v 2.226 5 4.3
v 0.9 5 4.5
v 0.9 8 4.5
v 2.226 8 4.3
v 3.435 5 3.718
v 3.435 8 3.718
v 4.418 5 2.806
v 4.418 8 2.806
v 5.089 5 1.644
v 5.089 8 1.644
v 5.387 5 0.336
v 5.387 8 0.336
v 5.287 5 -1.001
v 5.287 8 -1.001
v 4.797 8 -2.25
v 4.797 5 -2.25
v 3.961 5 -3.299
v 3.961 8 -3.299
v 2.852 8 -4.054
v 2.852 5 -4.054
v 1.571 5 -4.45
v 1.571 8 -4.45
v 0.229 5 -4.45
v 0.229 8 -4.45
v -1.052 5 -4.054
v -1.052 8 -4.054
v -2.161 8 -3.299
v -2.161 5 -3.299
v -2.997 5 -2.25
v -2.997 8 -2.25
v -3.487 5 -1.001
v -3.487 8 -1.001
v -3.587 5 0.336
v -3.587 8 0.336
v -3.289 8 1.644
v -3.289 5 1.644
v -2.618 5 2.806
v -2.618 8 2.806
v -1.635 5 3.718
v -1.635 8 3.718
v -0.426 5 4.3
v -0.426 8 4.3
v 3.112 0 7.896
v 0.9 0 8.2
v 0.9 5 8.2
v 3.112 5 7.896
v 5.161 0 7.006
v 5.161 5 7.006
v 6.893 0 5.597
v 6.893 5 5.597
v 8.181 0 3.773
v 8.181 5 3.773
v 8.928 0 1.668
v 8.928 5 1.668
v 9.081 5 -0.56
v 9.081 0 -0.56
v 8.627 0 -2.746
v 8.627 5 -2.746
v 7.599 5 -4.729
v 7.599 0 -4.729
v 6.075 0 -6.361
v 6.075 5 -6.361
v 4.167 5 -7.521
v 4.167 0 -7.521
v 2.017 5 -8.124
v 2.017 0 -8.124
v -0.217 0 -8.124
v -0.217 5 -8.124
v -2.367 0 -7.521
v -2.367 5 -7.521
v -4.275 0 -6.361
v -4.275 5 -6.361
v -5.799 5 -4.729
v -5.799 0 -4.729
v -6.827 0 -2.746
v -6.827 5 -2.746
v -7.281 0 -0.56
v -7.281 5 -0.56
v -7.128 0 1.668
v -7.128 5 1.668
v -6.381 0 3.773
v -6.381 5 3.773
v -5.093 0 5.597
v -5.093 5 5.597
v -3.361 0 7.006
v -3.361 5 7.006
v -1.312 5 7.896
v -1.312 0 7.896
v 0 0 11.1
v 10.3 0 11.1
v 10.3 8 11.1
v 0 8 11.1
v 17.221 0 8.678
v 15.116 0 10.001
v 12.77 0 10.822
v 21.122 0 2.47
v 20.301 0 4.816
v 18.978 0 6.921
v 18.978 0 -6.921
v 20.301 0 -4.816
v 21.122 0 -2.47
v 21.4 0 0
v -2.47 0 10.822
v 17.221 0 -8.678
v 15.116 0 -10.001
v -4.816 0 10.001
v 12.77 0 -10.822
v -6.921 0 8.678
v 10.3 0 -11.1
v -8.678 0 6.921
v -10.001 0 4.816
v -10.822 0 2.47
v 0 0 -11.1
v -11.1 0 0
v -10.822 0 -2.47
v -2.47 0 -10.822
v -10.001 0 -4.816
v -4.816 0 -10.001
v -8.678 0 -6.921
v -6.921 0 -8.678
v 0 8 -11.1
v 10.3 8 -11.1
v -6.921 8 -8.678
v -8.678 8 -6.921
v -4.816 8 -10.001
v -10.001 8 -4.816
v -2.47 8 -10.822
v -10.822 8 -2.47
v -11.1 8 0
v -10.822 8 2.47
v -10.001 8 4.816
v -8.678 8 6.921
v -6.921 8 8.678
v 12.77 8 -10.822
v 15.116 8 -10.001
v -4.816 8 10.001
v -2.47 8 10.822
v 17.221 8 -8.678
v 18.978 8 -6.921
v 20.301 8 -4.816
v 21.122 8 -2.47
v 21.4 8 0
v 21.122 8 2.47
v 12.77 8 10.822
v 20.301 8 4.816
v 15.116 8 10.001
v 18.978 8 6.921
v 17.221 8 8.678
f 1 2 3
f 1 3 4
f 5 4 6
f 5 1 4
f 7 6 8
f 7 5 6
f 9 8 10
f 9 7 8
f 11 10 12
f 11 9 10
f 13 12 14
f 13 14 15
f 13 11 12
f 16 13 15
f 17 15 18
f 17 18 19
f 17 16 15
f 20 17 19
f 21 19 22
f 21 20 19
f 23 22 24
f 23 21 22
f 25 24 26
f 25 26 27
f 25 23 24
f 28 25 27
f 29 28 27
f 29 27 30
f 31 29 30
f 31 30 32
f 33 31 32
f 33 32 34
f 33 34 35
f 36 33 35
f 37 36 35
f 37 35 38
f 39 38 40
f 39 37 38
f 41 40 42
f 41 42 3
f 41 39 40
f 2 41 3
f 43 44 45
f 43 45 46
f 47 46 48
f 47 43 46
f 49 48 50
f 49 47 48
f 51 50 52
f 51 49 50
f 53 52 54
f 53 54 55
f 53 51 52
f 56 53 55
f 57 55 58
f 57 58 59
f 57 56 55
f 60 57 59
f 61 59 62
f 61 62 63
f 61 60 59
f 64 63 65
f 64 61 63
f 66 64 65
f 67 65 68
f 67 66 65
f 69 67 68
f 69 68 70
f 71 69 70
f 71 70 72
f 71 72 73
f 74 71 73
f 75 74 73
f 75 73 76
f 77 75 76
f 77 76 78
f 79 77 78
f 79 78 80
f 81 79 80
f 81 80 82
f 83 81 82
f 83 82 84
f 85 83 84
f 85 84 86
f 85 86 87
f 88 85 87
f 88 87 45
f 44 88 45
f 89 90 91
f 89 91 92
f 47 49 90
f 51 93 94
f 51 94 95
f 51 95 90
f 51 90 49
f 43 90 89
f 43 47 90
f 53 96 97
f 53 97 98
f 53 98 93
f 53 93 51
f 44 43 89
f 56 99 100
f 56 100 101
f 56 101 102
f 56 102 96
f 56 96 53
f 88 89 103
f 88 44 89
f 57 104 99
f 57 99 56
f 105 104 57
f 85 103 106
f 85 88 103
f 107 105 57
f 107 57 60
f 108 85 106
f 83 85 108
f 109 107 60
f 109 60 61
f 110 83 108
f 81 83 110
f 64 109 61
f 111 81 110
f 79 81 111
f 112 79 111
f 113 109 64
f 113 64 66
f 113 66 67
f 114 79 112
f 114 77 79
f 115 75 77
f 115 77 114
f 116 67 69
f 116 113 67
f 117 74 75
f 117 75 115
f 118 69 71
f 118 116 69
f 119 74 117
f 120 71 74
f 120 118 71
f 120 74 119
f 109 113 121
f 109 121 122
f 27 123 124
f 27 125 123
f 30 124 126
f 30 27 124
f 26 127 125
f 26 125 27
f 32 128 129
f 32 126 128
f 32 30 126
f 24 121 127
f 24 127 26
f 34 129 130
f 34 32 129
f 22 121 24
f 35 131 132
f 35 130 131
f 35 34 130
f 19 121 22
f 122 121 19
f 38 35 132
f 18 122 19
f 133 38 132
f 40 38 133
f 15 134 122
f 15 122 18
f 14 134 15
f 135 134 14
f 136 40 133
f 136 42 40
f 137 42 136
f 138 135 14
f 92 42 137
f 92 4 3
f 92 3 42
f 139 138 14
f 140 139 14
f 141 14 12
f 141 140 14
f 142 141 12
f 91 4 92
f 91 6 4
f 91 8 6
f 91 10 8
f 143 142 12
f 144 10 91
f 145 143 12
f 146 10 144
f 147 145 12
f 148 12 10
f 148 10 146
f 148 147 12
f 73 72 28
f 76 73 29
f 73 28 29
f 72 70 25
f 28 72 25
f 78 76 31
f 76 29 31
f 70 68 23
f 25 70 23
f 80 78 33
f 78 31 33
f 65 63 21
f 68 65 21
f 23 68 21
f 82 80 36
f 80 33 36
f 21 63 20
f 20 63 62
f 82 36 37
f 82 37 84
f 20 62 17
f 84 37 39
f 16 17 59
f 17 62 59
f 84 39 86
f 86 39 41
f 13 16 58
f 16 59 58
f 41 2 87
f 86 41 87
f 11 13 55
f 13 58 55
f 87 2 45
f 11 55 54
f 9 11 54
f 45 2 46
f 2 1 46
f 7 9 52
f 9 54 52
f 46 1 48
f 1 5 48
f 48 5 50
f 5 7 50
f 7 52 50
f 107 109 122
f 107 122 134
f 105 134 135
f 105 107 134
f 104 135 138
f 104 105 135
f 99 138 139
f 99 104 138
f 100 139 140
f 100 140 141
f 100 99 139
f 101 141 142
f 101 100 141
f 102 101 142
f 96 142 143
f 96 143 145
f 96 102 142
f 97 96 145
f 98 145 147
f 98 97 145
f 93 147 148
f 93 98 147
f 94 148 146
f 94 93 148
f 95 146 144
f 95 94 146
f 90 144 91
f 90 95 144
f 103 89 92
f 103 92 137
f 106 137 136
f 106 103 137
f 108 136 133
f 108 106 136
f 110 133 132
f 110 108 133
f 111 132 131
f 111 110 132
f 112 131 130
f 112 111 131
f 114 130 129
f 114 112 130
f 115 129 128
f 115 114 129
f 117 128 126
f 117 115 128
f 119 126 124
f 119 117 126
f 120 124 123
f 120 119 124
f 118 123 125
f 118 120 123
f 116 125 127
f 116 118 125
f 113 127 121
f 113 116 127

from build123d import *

# Parameters (mm, degrees)
SKETCH1_R           = 8.2
BOSS_EXTRUDE1_DEPTH = 8
BOSS_EXTRUDE2_START = -3
SKETCH2_R           = 8.2
SKETCH2_R_2         = 4.5
BOSS_EXTRUDE2_DEPTH = 3


with BuildPart() as part:
    # Sketch1 → Boss-Extrude1 (new body)
    with BuildSketch(Plane(origin=(0, 0, 0), x_dir=(1, 0, 0), z_dir=(0, 1, 0))):
        with BuildLine():
            Line((0, 11.1), (10.3, 11.1))
            ThreePointArc((10.3, 11.1), (21.4, 0), (10.3, -11.1))
            Line((10.3, -11.1), (0, -11.1))
            ThreePointArc((0, -11.1), (-11.1, 0), (0, 11.1))
        make_face()
        with Locations(Location((0.9, 0, 0), (0, 0, 270))):
            Circle(SKETCH1_R, mode=Mode.SUBTRACT)
    extrude(amount=BOSS_EXTRUDE1_DEPTH)

    # Sketch2 → Boss-Extrude2 (add)
    with BuildSketch(Plane(origin=(0, 8, 0), x_dir=(1, 0, 0), z_dir=(0, 1, 0)).offset(BOSS_EXTRUDE2_START)):
        with Locations(Location((0.9, 0, 0), (0, 0, 270))):
            Circle(SKETCH2_R)
        with Locations(Location((0.9, 0, 0), (0, 0, 270))):
            Circle(SKETCH2_R_2, mode=Mode.SUBTRACT)
    extrude(amount=BOSS_EXTRUDE2_DEPTH)


solid = part.part
